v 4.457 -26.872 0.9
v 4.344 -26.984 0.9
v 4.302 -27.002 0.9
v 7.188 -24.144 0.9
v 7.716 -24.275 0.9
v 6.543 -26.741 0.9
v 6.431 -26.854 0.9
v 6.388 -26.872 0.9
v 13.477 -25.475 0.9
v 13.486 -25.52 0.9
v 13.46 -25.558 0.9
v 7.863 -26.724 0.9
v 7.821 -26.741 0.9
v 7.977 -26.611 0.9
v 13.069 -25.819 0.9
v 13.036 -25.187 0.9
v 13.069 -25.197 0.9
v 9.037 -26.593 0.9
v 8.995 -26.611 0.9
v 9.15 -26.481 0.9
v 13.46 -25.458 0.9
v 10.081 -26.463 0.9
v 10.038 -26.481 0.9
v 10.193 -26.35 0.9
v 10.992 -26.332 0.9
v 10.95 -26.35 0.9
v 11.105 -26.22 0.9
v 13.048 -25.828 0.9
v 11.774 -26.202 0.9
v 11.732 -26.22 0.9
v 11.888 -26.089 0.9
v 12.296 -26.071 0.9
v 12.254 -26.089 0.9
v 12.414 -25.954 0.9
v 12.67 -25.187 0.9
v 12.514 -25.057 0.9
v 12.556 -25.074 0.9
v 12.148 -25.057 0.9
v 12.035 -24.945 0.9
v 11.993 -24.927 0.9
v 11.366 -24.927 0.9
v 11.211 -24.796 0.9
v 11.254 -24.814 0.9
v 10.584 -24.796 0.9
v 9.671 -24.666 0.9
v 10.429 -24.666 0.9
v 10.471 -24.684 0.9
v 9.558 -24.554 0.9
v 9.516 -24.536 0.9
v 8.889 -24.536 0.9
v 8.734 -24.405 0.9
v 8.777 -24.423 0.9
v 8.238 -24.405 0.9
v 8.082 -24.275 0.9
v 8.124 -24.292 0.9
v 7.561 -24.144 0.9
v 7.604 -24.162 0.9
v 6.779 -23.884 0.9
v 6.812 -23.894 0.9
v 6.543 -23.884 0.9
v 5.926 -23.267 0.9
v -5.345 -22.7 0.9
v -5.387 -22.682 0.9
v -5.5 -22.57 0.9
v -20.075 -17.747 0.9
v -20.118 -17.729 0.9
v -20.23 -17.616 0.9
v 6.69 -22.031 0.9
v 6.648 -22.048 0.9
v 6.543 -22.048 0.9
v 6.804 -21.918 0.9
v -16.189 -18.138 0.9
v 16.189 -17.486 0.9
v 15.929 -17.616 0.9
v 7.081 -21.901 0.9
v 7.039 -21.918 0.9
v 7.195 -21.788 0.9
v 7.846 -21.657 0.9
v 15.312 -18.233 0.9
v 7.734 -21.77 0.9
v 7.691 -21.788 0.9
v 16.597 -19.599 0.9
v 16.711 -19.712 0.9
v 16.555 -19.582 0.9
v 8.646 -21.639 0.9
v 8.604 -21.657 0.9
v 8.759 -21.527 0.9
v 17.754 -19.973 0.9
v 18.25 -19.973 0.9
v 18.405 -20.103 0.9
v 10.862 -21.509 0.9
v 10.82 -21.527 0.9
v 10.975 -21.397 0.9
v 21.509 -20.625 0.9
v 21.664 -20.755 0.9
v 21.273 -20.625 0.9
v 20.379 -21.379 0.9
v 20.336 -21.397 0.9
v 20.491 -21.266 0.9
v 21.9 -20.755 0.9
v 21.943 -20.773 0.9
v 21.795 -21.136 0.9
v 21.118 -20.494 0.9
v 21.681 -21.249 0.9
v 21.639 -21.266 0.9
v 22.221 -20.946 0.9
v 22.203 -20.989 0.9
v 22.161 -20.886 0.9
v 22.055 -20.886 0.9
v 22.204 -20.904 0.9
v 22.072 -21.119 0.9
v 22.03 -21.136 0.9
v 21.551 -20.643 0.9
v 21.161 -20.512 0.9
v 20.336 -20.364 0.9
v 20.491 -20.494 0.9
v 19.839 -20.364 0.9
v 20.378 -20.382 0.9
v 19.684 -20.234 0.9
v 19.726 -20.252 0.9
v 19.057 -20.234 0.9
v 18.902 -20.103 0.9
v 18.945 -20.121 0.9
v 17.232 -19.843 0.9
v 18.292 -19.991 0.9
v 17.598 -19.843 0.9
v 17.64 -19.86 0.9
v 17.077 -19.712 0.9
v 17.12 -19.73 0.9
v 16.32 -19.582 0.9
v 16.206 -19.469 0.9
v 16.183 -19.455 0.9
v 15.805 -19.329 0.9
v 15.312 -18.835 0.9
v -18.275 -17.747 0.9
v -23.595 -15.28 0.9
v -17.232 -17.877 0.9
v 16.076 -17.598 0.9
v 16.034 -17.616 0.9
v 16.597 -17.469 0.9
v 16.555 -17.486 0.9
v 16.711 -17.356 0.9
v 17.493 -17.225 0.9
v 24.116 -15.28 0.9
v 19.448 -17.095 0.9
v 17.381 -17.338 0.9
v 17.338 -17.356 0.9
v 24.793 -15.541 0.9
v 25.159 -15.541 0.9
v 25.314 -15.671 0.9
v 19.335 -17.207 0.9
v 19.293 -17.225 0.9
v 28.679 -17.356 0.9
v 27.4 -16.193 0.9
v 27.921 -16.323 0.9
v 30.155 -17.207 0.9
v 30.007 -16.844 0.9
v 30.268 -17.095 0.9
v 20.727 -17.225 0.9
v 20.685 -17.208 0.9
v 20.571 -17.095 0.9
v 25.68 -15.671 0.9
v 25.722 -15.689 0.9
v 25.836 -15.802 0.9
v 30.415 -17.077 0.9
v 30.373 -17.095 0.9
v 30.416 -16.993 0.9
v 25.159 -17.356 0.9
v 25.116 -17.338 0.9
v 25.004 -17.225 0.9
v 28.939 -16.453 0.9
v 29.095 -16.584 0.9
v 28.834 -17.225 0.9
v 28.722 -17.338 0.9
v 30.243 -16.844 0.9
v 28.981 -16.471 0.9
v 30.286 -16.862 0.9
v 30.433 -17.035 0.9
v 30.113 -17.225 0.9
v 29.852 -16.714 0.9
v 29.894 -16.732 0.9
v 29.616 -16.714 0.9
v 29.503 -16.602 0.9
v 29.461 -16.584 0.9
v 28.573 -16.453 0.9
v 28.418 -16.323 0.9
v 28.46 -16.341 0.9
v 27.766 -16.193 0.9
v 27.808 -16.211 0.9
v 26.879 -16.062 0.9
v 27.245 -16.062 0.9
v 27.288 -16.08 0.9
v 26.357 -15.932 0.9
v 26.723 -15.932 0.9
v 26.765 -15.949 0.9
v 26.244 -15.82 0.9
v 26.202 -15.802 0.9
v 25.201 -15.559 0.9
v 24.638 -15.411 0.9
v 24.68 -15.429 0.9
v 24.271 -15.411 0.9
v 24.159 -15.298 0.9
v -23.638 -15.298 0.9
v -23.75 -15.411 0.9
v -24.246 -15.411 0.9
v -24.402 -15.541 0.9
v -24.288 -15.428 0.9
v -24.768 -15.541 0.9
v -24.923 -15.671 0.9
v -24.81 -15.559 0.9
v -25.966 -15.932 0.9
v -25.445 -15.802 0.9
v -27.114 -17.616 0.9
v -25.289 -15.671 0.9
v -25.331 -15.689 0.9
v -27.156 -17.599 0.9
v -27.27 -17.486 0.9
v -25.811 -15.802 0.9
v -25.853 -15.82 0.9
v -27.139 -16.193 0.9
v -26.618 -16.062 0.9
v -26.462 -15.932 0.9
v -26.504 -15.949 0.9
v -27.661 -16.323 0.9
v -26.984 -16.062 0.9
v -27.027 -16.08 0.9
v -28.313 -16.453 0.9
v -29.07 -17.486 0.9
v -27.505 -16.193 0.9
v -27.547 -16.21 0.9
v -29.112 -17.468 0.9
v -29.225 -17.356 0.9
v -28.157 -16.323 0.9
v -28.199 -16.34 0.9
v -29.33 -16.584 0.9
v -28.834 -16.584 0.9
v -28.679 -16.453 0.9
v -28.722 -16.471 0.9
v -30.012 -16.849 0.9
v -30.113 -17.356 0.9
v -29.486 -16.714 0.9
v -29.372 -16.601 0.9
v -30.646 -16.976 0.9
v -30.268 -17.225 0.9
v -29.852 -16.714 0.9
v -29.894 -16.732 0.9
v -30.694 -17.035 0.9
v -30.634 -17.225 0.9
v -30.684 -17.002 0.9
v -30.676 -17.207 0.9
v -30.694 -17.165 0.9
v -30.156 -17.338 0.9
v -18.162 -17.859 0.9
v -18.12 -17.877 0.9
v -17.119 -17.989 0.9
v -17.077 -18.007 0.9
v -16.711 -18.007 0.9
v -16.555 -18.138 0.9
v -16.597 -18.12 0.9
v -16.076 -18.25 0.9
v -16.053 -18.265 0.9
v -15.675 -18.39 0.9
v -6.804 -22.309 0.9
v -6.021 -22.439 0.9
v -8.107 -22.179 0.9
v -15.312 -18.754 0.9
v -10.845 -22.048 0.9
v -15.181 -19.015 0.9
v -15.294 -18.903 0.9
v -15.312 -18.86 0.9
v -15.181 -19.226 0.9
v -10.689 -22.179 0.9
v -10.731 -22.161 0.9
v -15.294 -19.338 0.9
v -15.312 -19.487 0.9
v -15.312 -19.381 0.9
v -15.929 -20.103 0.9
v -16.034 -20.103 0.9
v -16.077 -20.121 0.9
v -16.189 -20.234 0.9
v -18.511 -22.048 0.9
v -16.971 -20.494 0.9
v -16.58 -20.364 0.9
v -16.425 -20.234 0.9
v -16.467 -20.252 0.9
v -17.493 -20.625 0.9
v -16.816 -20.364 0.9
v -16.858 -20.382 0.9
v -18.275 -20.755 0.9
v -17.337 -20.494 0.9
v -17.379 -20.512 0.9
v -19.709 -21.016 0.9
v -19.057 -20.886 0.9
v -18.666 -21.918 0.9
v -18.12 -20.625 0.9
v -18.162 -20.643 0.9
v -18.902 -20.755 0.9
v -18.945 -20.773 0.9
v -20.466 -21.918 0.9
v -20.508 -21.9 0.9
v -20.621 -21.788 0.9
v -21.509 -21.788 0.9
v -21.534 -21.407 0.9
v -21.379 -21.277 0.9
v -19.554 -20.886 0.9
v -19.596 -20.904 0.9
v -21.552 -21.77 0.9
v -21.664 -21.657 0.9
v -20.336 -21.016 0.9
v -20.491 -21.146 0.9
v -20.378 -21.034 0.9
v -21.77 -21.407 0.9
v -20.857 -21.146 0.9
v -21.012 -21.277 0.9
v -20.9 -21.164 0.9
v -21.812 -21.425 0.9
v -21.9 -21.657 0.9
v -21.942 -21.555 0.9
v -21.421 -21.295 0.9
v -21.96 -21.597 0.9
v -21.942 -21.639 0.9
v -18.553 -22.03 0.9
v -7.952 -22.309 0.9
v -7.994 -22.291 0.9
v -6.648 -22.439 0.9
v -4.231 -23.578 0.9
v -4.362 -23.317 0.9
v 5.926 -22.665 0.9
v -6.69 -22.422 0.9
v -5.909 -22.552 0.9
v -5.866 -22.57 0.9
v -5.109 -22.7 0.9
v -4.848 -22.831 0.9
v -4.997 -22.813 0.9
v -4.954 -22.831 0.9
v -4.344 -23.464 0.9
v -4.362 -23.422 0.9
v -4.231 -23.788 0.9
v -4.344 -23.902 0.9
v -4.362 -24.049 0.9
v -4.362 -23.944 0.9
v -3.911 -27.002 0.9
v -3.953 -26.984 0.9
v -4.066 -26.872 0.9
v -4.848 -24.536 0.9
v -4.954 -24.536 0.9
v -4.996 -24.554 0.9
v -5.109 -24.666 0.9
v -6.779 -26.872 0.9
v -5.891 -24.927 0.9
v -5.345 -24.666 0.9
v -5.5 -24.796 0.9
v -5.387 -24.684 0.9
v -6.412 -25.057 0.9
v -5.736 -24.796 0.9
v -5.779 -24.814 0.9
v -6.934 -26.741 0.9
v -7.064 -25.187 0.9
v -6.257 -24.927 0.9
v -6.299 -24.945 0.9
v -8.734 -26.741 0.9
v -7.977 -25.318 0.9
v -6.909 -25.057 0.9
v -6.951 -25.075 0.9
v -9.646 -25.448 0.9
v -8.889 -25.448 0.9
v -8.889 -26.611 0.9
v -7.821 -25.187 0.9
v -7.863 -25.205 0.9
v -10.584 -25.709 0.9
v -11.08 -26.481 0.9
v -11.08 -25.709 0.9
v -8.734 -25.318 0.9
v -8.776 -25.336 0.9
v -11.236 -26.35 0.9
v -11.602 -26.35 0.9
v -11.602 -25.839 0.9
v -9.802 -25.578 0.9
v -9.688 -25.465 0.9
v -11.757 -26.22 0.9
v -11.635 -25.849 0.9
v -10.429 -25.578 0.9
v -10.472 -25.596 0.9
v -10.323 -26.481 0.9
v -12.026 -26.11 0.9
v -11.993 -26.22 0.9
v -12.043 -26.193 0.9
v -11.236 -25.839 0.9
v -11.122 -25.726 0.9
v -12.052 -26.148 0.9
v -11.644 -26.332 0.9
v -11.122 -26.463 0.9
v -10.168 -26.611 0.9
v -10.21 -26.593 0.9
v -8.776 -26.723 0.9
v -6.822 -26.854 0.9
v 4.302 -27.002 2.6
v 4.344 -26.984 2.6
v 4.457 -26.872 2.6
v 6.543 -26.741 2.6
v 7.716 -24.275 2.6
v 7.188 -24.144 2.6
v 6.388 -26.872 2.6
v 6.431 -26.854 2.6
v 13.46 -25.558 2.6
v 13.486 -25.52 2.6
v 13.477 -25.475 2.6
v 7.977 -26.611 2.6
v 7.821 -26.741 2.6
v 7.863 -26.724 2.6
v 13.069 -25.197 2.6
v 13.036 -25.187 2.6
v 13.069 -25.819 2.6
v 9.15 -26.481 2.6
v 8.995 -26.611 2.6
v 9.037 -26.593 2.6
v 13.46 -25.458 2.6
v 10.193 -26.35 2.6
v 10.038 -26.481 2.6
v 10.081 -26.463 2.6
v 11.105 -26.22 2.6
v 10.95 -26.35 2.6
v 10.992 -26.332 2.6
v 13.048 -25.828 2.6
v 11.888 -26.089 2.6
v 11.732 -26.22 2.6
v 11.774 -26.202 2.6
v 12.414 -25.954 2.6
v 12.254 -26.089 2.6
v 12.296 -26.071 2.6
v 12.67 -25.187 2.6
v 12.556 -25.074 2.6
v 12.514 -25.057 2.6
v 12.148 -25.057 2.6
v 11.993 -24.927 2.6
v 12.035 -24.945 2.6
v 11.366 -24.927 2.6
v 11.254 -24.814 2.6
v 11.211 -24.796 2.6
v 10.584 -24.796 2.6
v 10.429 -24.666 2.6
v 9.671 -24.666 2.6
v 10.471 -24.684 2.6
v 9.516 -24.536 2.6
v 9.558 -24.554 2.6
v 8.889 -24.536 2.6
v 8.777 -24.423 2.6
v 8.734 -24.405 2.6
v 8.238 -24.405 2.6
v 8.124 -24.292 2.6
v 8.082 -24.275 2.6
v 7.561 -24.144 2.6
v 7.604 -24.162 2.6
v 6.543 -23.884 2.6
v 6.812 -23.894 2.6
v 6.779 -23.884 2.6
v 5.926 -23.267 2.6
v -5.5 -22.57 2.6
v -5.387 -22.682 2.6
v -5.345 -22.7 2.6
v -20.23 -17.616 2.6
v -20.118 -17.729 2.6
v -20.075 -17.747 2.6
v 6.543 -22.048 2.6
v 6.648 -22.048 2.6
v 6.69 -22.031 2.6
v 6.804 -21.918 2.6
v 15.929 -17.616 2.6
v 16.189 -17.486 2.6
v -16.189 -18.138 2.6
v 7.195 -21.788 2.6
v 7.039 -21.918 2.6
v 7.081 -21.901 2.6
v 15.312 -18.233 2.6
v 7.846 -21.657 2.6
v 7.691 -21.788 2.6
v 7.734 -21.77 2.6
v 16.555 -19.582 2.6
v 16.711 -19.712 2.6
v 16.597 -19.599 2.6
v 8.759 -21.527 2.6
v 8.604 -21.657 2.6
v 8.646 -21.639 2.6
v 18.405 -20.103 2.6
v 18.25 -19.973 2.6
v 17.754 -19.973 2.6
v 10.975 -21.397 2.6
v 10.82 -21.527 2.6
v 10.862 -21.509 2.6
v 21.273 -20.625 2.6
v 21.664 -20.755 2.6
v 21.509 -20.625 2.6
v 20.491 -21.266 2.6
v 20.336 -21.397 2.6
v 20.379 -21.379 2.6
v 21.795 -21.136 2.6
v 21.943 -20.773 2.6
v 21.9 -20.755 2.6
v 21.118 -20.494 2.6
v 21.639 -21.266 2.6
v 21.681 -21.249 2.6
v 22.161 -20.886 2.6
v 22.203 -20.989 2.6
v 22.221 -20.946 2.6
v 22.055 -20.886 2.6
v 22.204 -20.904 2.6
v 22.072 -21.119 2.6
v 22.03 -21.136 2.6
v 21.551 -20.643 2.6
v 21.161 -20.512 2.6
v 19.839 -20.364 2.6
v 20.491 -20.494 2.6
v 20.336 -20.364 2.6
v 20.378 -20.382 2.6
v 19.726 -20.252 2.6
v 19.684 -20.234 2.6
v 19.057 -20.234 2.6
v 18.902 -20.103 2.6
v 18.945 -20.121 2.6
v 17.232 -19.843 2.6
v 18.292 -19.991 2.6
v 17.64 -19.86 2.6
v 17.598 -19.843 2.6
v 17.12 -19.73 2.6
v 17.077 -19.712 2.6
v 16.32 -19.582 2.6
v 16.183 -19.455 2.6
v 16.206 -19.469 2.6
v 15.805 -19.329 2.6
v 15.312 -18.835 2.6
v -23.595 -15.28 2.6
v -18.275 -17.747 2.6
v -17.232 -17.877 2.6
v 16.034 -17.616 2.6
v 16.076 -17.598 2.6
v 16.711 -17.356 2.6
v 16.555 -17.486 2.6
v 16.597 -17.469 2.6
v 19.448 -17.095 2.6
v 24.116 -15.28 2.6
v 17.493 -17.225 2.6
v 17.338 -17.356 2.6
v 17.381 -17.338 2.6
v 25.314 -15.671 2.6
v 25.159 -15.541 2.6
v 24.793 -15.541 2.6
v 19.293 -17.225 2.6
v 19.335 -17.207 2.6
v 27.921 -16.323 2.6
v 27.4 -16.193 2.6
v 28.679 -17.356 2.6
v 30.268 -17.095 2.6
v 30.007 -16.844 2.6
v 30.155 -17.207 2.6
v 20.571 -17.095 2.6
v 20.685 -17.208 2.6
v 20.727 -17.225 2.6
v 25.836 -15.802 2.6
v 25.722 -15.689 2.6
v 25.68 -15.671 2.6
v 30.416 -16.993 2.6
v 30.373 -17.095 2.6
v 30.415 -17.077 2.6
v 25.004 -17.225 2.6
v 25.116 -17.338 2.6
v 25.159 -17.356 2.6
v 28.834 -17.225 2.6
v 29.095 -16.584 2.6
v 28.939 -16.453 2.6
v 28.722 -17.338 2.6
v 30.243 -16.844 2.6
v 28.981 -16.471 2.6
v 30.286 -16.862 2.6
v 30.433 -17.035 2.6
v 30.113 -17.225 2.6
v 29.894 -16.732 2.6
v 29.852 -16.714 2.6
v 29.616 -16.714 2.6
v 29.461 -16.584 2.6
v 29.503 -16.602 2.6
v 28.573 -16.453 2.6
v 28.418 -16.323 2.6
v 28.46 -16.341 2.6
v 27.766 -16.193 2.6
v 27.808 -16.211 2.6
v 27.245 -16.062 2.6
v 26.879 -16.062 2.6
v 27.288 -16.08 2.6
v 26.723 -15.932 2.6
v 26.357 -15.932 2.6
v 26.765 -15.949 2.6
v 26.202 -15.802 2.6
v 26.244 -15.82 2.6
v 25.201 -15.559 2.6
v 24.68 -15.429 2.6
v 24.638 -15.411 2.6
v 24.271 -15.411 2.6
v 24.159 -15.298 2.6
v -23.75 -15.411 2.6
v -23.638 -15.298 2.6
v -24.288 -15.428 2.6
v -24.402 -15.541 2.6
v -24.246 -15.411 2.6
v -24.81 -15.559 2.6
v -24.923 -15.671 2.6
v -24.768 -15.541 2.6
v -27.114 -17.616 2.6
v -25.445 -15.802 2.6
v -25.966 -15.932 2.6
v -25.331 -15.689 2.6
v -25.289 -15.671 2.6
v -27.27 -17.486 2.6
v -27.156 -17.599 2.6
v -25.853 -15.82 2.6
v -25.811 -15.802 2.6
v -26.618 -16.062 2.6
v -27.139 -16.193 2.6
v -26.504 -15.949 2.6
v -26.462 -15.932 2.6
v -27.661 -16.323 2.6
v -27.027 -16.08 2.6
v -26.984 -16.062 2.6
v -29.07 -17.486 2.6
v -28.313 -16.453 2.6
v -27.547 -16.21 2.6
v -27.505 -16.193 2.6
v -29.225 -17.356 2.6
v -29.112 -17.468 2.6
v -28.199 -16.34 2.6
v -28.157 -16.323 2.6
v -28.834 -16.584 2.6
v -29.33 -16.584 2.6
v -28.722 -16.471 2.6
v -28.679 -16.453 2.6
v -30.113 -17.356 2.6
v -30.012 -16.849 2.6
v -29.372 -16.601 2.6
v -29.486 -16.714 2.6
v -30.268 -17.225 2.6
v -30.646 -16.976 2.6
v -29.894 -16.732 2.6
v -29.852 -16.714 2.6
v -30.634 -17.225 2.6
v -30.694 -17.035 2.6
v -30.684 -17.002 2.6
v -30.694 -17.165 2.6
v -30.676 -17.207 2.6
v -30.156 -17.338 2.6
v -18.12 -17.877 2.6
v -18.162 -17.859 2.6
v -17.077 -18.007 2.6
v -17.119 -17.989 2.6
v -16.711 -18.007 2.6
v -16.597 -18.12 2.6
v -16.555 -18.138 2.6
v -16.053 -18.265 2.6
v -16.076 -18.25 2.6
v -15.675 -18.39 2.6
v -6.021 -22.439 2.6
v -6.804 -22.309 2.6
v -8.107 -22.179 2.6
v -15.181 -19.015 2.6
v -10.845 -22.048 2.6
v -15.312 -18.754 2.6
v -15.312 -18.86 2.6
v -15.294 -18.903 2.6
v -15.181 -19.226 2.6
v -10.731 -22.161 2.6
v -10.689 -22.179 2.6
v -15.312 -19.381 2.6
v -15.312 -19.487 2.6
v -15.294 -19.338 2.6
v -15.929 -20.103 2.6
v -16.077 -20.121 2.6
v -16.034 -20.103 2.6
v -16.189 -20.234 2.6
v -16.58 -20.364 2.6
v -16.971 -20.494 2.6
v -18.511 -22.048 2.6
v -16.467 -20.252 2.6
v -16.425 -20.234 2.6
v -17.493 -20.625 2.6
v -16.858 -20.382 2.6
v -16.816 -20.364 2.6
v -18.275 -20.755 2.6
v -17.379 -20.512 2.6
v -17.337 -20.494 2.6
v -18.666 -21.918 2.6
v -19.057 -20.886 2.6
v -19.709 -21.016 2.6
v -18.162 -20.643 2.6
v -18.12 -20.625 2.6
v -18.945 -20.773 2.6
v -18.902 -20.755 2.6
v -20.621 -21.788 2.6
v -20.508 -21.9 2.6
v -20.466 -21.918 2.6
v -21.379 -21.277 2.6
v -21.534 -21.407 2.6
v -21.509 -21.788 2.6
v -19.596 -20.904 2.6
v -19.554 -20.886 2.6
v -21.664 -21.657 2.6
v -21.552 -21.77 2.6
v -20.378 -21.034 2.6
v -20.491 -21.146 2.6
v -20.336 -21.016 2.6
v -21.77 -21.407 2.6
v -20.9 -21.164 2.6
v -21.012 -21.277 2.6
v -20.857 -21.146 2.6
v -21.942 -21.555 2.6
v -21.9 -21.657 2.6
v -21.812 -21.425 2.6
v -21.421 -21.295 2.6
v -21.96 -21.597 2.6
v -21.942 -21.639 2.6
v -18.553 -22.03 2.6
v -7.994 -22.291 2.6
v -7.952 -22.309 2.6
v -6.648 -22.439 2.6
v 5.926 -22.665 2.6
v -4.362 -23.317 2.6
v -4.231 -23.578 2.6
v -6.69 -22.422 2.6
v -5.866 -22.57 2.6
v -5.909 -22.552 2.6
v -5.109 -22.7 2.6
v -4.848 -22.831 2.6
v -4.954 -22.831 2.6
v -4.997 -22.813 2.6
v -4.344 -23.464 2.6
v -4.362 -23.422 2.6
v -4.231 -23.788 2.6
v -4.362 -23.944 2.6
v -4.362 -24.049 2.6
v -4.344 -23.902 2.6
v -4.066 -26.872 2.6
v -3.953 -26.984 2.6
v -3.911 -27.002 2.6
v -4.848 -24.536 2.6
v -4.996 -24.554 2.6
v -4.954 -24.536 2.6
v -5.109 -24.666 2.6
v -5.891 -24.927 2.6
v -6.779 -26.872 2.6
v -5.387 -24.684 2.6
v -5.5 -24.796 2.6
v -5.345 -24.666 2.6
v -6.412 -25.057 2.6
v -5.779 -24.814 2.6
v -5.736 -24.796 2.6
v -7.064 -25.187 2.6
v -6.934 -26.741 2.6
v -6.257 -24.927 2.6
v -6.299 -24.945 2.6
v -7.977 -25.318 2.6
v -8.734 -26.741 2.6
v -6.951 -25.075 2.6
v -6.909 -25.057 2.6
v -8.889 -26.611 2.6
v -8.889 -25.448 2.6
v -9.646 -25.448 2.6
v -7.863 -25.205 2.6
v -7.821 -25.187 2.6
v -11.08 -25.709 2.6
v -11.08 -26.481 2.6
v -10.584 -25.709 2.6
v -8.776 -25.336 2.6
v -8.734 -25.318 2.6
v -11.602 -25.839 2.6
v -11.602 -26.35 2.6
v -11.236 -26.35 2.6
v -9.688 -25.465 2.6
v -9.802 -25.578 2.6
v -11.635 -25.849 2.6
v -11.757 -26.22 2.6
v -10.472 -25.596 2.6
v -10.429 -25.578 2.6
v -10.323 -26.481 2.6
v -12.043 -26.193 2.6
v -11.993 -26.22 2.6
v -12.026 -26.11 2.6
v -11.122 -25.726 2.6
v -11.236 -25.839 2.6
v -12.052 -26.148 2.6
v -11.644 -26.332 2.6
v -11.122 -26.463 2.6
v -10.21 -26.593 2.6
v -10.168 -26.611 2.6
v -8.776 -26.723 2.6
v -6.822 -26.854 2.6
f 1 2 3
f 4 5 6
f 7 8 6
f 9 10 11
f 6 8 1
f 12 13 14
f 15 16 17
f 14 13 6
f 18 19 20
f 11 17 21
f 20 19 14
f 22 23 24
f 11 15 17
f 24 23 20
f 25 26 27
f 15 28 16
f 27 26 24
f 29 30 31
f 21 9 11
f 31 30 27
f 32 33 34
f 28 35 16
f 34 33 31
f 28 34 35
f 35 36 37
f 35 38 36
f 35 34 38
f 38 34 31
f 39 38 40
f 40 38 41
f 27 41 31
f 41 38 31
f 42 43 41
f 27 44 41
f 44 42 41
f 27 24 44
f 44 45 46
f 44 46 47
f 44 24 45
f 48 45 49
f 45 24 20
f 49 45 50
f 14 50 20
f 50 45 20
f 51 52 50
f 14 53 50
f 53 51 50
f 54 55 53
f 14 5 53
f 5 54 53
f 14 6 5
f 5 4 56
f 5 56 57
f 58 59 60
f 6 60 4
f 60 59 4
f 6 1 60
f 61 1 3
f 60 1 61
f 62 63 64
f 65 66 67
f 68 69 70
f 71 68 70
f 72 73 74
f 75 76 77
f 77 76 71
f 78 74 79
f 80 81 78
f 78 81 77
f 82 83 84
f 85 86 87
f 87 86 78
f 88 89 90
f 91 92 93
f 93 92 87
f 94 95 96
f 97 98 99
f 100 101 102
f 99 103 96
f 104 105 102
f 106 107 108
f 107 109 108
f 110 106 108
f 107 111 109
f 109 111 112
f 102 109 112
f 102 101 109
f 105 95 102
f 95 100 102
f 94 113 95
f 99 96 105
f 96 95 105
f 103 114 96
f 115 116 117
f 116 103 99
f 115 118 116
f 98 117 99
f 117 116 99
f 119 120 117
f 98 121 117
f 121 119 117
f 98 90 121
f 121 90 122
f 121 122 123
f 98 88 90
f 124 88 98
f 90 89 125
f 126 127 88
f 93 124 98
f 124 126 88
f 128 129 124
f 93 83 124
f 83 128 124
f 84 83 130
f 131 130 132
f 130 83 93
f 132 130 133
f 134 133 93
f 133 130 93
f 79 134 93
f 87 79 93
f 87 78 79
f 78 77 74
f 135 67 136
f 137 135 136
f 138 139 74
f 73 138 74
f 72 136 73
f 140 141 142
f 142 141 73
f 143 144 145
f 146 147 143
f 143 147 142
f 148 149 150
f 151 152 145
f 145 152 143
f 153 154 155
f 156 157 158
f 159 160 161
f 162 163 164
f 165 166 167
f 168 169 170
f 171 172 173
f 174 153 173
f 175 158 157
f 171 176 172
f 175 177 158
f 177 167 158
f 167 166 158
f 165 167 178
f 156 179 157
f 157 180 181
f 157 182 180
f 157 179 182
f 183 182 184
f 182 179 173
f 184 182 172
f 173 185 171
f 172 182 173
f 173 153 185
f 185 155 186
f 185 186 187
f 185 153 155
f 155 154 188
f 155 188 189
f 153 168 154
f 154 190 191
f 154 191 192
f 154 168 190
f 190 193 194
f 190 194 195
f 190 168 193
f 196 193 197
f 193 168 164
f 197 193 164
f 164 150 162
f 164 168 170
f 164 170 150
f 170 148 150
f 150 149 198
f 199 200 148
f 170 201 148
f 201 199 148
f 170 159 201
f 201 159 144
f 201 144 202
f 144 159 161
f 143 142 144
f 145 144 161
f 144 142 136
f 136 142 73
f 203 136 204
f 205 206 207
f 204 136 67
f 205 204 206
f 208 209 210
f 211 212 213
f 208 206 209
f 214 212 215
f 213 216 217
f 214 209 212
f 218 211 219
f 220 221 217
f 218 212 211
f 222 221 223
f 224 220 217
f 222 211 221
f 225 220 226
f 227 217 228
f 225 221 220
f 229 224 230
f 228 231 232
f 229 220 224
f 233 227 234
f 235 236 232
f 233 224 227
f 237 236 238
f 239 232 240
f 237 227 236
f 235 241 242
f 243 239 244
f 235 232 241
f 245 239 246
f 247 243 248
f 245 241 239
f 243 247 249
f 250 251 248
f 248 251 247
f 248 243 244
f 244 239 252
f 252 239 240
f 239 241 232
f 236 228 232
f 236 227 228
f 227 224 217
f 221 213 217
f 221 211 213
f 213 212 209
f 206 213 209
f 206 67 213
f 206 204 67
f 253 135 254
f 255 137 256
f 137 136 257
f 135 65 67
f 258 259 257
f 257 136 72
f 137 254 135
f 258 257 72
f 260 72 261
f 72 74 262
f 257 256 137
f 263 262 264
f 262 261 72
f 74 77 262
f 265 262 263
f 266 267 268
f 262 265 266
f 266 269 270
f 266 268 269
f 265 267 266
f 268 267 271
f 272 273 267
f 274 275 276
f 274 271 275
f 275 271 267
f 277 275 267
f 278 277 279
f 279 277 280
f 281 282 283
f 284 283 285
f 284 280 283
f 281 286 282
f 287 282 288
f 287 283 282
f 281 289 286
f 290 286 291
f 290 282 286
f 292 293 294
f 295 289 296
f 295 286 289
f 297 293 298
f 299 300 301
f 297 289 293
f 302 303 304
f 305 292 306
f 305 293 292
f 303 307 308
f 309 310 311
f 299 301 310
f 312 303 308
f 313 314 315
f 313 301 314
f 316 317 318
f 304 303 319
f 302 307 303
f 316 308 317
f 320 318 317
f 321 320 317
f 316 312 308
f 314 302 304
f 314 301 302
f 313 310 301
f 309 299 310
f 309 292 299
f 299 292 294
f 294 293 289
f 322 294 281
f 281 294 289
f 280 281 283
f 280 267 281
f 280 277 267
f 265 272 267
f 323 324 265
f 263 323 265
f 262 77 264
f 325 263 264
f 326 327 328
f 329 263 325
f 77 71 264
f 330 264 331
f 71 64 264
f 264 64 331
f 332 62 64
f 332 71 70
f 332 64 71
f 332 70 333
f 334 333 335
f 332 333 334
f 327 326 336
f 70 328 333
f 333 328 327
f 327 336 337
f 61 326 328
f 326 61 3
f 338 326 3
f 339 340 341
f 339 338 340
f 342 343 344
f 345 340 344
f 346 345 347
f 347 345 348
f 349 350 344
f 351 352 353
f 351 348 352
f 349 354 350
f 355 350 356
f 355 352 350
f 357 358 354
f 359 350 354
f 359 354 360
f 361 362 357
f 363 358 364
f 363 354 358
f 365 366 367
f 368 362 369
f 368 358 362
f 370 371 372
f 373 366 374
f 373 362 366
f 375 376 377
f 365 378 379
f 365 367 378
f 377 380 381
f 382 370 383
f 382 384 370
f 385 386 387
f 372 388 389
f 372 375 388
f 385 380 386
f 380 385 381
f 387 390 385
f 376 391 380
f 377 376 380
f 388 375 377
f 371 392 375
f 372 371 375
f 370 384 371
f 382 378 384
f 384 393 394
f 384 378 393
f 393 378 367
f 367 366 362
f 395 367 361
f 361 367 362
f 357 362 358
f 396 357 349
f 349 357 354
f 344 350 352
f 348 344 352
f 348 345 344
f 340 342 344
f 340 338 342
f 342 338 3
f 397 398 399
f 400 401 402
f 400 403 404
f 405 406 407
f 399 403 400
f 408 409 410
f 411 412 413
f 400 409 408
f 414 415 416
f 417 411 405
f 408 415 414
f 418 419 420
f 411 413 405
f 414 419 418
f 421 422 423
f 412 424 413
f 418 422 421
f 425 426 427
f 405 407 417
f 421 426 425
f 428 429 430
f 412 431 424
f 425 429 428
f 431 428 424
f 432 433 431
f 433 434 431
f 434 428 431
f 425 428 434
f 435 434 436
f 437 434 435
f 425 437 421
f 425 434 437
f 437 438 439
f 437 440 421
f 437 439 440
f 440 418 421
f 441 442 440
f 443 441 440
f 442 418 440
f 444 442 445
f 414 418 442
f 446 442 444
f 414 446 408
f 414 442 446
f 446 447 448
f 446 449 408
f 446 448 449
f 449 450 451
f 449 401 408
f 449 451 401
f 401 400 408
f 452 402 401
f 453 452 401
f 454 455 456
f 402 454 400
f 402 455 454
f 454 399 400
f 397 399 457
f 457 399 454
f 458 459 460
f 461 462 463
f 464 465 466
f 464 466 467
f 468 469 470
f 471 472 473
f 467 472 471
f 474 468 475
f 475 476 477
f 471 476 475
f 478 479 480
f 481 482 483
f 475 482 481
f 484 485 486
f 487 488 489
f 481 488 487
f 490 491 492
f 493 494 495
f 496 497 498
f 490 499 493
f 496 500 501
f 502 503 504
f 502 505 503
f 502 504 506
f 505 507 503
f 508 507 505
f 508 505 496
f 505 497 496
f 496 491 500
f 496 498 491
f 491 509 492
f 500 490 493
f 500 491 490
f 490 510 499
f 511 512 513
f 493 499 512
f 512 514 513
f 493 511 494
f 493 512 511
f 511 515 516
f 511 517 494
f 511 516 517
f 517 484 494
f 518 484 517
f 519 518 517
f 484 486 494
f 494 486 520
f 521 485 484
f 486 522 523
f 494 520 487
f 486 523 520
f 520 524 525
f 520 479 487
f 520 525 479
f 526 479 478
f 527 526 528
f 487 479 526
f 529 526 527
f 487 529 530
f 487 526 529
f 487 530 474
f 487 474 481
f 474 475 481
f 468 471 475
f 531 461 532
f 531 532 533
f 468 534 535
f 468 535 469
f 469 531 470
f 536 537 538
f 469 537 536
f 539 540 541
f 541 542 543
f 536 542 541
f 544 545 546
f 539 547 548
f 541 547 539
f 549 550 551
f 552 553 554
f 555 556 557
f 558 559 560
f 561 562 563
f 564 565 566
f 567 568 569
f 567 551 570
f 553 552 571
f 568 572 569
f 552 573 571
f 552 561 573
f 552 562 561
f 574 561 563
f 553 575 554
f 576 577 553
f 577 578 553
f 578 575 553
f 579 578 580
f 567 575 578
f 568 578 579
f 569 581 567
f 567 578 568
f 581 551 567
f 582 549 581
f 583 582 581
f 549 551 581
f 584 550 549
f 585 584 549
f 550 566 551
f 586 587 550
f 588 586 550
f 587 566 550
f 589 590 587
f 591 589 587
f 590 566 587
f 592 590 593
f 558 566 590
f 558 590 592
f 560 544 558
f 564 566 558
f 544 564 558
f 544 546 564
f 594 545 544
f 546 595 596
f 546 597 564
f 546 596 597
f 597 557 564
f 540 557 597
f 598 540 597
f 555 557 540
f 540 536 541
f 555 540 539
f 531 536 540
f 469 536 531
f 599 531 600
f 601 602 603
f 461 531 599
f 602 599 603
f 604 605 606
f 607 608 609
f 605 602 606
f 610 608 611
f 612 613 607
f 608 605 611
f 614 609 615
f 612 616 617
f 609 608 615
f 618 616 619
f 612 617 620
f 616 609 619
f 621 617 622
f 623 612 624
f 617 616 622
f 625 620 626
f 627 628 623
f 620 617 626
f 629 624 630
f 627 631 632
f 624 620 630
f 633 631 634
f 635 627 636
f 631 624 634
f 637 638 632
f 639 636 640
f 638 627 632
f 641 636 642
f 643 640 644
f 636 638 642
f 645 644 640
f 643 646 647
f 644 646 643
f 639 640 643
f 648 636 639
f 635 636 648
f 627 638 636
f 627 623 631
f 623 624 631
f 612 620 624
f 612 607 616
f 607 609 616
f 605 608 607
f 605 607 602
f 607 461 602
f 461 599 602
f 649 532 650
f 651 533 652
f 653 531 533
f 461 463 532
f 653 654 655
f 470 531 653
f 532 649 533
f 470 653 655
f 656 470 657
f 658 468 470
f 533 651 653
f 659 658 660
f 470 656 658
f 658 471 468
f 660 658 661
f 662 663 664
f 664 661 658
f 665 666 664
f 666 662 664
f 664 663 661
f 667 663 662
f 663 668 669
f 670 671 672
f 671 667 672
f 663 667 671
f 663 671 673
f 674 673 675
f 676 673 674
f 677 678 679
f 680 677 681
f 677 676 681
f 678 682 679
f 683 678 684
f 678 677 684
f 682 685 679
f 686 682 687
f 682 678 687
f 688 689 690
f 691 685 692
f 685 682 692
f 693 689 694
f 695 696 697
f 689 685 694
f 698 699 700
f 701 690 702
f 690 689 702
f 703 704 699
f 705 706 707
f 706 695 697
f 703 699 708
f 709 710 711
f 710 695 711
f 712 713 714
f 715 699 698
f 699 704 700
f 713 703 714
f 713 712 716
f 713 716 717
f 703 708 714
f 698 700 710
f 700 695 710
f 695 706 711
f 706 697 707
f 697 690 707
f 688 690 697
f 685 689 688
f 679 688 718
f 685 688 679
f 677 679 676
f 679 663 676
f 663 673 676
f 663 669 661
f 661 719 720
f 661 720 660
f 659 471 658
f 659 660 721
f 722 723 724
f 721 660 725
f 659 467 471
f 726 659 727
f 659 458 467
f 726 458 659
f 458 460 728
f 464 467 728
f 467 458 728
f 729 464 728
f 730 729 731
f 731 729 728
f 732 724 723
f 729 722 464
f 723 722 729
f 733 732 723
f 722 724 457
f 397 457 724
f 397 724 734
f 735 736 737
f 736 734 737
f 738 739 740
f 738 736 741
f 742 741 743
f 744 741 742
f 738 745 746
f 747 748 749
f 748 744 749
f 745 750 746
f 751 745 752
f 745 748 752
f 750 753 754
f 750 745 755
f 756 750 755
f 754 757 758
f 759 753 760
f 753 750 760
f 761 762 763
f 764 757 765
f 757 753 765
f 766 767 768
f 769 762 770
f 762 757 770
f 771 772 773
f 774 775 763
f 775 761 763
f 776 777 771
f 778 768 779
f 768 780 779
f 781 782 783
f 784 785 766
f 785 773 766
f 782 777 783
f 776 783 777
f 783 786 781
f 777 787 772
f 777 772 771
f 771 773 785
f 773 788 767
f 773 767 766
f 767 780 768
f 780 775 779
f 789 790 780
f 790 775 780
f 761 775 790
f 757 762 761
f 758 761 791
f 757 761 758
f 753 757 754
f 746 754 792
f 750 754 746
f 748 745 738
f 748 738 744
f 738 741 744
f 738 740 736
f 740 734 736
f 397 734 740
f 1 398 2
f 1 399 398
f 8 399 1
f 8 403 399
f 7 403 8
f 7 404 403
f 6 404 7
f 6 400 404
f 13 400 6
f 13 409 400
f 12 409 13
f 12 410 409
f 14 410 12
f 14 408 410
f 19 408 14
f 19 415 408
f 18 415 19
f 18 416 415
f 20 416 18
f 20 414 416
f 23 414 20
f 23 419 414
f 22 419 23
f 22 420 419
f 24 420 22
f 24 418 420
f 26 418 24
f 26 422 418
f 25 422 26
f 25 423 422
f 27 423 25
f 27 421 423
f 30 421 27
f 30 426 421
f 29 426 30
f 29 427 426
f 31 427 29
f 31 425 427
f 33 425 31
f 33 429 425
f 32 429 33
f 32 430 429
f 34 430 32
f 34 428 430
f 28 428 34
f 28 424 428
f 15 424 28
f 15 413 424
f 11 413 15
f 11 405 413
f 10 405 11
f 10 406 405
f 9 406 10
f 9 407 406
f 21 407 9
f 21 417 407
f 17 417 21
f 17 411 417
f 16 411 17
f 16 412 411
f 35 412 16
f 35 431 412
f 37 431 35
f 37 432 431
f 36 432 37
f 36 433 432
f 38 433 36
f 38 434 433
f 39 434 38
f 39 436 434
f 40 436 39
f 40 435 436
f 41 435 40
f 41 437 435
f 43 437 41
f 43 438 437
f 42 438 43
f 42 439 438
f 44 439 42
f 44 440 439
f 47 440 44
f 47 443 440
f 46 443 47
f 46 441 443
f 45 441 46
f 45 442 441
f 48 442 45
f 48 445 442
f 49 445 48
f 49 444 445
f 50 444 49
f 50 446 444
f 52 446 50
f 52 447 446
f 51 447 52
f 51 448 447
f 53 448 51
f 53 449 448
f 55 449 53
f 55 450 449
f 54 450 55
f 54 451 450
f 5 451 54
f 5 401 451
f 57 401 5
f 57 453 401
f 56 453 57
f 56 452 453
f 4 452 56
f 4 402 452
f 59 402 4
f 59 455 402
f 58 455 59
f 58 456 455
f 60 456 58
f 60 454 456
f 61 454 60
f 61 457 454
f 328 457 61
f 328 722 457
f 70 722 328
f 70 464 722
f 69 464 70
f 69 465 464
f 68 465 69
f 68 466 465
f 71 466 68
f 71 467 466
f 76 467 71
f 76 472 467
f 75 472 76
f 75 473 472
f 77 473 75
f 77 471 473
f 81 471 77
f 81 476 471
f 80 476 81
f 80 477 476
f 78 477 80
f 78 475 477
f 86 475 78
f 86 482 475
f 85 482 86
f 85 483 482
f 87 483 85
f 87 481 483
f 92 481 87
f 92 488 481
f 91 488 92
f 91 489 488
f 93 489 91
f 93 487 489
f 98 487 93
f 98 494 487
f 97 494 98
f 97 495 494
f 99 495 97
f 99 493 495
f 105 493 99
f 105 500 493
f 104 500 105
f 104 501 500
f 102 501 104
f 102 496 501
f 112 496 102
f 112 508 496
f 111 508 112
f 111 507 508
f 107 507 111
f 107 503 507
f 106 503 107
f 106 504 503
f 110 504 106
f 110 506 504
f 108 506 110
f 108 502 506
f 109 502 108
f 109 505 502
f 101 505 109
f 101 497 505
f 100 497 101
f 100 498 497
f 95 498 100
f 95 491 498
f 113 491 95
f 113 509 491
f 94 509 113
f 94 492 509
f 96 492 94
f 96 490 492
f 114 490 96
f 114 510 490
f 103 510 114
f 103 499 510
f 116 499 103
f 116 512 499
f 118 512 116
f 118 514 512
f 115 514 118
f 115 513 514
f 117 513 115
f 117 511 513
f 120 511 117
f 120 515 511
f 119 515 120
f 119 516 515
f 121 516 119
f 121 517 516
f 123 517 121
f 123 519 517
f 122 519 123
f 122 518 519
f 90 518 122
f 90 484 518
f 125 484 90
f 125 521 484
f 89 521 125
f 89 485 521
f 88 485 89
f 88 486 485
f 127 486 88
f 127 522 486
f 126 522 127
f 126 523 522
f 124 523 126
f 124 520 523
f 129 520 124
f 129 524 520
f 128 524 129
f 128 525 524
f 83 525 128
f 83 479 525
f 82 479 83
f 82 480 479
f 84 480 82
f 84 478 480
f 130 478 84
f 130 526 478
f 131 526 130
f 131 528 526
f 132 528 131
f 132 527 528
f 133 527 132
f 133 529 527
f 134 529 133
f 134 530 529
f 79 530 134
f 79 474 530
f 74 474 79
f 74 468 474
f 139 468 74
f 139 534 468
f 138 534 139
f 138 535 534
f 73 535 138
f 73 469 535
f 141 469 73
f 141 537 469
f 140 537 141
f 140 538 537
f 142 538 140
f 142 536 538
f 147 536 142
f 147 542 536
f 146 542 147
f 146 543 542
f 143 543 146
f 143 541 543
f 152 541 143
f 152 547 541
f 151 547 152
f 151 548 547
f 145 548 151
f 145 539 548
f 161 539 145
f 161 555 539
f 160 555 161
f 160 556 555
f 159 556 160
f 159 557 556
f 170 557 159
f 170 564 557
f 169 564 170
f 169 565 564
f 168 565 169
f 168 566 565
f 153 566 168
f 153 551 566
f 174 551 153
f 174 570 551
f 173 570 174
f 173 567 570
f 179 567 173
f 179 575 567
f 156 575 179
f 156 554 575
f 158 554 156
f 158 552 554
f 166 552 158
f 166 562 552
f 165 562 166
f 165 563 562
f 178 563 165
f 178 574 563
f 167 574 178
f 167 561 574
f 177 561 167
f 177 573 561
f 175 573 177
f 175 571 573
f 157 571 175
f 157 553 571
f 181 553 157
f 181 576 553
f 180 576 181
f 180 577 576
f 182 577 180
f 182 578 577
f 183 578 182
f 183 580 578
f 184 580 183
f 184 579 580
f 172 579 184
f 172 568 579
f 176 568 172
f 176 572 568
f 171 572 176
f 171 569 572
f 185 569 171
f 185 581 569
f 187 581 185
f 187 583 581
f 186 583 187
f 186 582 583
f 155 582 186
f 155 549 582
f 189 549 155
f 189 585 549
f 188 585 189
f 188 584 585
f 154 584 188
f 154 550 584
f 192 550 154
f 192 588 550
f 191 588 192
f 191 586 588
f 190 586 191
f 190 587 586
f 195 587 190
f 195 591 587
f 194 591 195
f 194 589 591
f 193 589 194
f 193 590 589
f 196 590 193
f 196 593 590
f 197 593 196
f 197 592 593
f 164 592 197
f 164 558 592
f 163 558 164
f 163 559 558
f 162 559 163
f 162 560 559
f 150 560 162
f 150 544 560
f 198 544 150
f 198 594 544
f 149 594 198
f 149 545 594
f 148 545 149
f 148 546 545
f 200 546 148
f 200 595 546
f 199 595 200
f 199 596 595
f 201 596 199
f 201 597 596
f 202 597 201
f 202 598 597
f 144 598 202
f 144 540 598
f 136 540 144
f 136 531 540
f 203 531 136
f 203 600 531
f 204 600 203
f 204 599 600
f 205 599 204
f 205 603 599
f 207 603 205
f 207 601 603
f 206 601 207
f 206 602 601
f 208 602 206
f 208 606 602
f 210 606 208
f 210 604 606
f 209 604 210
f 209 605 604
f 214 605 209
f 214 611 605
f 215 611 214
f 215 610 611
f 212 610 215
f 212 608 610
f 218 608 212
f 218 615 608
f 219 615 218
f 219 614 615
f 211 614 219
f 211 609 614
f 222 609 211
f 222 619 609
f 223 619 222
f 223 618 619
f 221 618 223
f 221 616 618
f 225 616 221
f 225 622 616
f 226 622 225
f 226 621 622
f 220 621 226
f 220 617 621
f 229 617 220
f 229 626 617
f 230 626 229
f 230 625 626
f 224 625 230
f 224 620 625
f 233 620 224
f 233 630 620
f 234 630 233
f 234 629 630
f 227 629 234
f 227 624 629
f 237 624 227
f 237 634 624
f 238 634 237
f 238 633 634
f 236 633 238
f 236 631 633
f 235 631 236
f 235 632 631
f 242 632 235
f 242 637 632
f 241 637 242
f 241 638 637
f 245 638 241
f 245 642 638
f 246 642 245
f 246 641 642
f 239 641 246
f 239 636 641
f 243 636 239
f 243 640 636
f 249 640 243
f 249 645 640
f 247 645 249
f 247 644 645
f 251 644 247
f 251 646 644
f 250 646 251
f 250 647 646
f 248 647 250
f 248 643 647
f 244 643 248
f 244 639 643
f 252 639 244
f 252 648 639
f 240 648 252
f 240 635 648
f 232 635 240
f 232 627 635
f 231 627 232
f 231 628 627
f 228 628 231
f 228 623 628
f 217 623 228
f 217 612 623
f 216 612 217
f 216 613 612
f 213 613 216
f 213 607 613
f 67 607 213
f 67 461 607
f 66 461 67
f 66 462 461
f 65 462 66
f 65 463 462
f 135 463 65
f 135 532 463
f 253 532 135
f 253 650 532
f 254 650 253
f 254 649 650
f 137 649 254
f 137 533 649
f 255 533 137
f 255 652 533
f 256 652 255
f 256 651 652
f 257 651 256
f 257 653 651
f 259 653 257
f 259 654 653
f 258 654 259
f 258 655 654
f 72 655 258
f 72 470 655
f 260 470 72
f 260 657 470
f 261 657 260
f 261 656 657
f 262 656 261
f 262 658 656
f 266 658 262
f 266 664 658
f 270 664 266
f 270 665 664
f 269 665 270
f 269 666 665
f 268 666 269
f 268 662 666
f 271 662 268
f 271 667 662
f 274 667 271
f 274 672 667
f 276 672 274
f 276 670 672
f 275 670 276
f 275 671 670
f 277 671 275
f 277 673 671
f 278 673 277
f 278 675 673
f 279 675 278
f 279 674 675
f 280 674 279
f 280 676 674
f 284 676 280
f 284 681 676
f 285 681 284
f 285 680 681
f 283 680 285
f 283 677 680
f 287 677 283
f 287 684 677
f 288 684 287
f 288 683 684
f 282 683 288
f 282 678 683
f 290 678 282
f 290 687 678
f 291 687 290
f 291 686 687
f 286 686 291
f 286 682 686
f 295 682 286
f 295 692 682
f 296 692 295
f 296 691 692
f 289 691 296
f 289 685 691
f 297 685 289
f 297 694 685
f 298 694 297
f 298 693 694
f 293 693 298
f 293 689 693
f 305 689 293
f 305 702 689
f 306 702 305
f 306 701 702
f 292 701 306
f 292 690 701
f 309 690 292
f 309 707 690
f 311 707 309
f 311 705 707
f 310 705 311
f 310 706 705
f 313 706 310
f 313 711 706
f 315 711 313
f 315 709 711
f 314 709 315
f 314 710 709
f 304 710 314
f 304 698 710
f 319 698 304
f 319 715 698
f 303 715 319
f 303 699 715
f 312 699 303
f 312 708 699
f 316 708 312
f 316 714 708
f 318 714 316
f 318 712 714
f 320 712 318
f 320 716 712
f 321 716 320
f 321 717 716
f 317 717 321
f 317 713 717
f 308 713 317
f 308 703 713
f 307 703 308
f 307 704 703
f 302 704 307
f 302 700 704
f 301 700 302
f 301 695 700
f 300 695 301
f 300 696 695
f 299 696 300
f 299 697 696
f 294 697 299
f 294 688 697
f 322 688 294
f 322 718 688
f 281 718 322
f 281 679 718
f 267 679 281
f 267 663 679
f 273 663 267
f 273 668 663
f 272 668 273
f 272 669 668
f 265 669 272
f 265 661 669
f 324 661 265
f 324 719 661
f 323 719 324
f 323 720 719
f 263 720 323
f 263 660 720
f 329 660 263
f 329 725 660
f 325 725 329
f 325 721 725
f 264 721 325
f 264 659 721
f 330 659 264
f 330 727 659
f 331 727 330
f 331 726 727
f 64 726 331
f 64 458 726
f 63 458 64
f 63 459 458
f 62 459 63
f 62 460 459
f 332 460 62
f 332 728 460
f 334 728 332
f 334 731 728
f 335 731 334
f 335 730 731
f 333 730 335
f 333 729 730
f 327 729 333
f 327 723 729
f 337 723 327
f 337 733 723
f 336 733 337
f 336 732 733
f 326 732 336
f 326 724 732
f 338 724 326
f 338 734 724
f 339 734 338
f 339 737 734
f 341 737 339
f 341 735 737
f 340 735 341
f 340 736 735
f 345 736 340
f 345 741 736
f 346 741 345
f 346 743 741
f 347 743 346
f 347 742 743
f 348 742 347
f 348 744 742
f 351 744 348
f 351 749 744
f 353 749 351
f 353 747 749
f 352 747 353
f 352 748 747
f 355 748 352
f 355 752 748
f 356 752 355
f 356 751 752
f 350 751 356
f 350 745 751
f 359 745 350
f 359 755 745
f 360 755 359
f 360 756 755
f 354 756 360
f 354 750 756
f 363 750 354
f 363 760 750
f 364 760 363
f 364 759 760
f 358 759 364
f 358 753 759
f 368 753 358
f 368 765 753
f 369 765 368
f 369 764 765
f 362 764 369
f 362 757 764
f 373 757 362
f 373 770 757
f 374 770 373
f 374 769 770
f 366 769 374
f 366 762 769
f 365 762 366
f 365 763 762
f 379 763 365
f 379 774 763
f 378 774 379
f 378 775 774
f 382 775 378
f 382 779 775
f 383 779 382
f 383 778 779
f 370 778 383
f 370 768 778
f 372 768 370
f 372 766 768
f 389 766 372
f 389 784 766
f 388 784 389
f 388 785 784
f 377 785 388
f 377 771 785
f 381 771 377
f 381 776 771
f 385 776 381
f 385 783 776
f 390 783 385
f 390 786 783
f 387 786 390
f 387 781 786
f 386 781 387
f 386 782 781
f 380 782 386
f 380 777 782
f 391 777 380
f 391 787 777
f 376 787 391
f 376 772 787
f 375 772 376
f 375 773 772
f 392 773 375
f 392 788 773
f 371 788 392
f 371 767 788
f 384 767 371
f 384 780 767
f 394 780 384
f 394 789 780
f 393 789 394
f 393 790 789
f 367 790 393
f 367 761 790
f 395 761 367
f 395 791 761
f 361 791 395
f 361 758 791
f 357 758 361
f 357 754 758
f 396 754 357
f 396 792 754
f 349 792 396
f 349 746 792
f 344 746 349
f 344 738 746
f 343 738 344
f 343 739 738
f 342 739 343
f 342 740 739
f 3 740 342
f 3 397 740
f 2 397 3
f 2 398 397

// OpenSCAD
$fn = 24;
translate([0, -2.500, 0.900])
  linear_extrude(height=1.700) {
offset(r=0.06, $fn=8) {
    polygon(points=[[-30.634,-14.665],[-30.243,-14.665],[-30.113,-14.796],[-29.200,-14.796],[-29.070,-14.926],[-27.245,-14.926],[-27.114,-15.056],[-20.205,-15.056],[-20.075,-15.187],[-18.250,-15.187],[-18.120,-15.317],[-17.207,-15.317],[-17.077,-15.447],[-16.686,-15.447],[-16.555,-15.578],[-16.164,-15.578],[-16.034,-15.708],[-15.643,-15.838],[-15.252,-16.229],[-15.252,-16.360],[-15.121,-16.490],[-15.121,-16.751],[-15.252,-16.881],[-15.252,-17.012],[-15.904,-17.663],[-16.034,-17.663],[-16.164,-17.794],[-16.425,-17.794],[-16.555,-17.924],[-16.816,-17.924],[-16.946,-18.054],[-17.337,-18.054],[-17.468,-18.185],[-18.120,-18.185],[-18.250,-18.315],[-18.902,-18.315],[-19.032,-18.446],[-19.554,-18.446],[-19.684,-18.576],[-20.336,-18.576],[-20.466,-18.706],[-20.857,-18.706],[-20.987,-18.837],[-21.379,-18.837],[-21.509,-18.967],[-21.770,-18.967],[-21.900,-19.097],[-21.639,-19.097],[-21.509,-19.228],[-20.596,-19.228],[-20.466,-19.358],[-18.641,-19.358],[-18.511,-19.488],[-10.820,-19.488],[-10.689,-19.619],[-8.082,-19.619],[-7.952,-19.749],[-6.779,-19.749],[-6.648,-19.879],[-5.996,-19.879],[-5.866,-20.010],[-5.475,-20.010],[-5.345,-20.140],[-5.084,-20.140],[-4.954,-20.271],[-4.823,-20.271],[-4.302,-20.792],[-4.302,-20.922],[-4.171,-21.053],[-4.171,-21.313],[-4.302,-21.444],[-4.302,-21.574],[-4.823,-22.096],[-4.954,-22.096],[-5.084,-22.226],[-5.345,-22.226],[-5.475,-22.356],[-5.736,-22.356],[-5.866,-22.487],[-6.257,-22.487],[-6.387,-22.617],[-6.909,-22.617],[-7.039,-22.747],[-7.821,-22.747],[-7.952,-22.878],[-8.734,-22.878],[-8.864,-23.008],[-9.646,-23.008],[-9.777,-23.138],[-10.429,-23.138],[-10.559,-23.269],[-11.080,-23.269],[-11.211,-23.399],[-11.602,-23.399],[-11.993,-23.660],[-11.732,-23.660],[-11.602,-23.790],[-11.211,-23.790],[-11.080,-23.921],[-10.298,-23.921],[-10.168,-24.051],[-8.864,-24.051],[-8.734,-24.181],[-6.909,-24.181],[-6.779,-24.312],[-4.041,-24.312],[-3.911,-24.442],[4.302,-24.442],[4.432,-24.312],[6.388,-24.312],[6.518,-24.181],[7.821,-24.181],[7.952,-24.051],[8.995,-24.051],[9.125,-23.921],[10.038,-23.921],[10.168,-23.790],[10.950,-23.790],[11.080,-23.660],[11.732,-23.660],[11.863,-23.529],[12.254,-23.529],[12.384,-23.399],[13.036,-23.269],[13.427,-23.008],[13.036,-22.747],[12.645,-22.747],[12.514,-22.617],[12.123,-22.617],[11.993,-22.487],[11.341,-22.487],[11.211,-22.356],[10.559,-22.356],[10.429,-22.226],[9.646,-22.226],[9.516,-22.096],[8.864,-22.096],[8.734,-21.965],[8.213,-21.965],[8.082,-21.835],[7.691,-21.835],[7.561,-21.704],[7.170,-21.704],[6.779,-21.444],[6.518,-21.444],[5.866,-20.792],[5.866,-20.140],[6.518,-19.488],[6.648,-19.488],[6.779,-19.358],[7.039,-19.358],[7.170,-19.228],[7.691,-19.228],[7.821,-19.097],[8.604,-19.097],[8.734,-18.967],[10.820,-18.967],[10.950,-18.837],[20.336,-18.837],[20.466,-18.706],[21.639,-18.706],[21.770,-18.576],[22.030,-18.576],[22.161,-18.446],[22.030,-18.446],[21.900,-18.315],[21.639,-18.315],[21.509,-18.185],[21.248,-18.185],[21.118,-18.054],[20.466,-18.054],[20.336,-17.924],[19.814,-17.924],[19.684,-17.794],[19.032,-17.794],[18.902,-17.663],[18.380,-17.663],[18.250,-17.533],[17.729,-17.533],[17.598,-17.403],[17.207,-17.403],[17.077,-17.272],[16.686,-17.272],[16.555,-17.142],[16.295,-17.142],[16.164,-17.012],[15.773,-16.881],[15.252,-16.360],[15.252,-15.708],[15.904,-15.056],[16.034,-15.056],[16.164,-14.926],[16.555,-14.926],[16.686,-14.796],[17.338,-14.796],[17.468,-14.665],[19.293,-14.665],[19.423,-14.535],[20.596,-14.535],[20.727,-14.665],[25.029,-14.665],[25.159,-14.796],[28.679,-14.796],[28.809,-14.665],[30.113,-14.665],[30.243,-14.535],[30.504,-14.535],[30.373,-14.535],[30.243,-14.404],[29.982,-14.404],[29.852,-14.274],[29.591,-14.274],[29.461,-14.144],[29.070,-14.144],[28.939,-14.013],[28.548,-14.013],[28.418,-13.883],[27.896,-13.883],[27.766,-13.753],[27.375,-13.753],[27.245,-13.622],[26.854,-13.622],[26.723,-13.492],[26.332,-13.492],[26.202,-13.362],[25.811,-13.362],[25.680,-13.231],[25.289,-13.231],[25.159,-13.101],[24.768,-13.101],[24.638,-12.971],[24.246,-12.971],[24.116,-12.840],[-23.595,-12.840],[-23.725,-12.971],[-24.246,-12.971],[-24.377,-13.101],[-24.768,-13.101],[-24.898,-13.231],[-25.289,-13.231],[-25.420,-13.362],[-25.811,-13.362],[-25.941,-13.492],[-26.462,-13.492],[-26.593,-13.622],[-26.984,-13.622],[-27.114,-13.753],[-27.505,-13.753],[-27.636,-13.883],[-28.157,-13.883],[-28.288,-14.013],[-28.679,-14.013],[-28.809,-14.144],[-29.330,-14.144],[-29.461,-14.274],[-29.852,-14.274],[-29.982,-14.404],[-30.634,-14.535]], paths=[[0,1,2,3,4,5,6,7,8,9,10,11,12,13,14,15,16,17,18,19,20,21,22,23,24,25,26,27,28,29,30,31,32,33,34,35,36,37,38,39,40,41,42,43,44,45,46,47,48,49,50,51,52,53,54,55,56,57,58,59,60,61,62,63,64,65,66,67,68,69,70,71,72,73,74,75,76,77,78,79,80,81,82,83,84,85,86,87,88,89,90,91,92,93,94,95,96,97,98,99,100,101,102,103,104,105,106,107,108,109,110,111,112,113,114,115,116,117,118,119,120,121,122,123,124,125,126,127,128,129,130,131,132,133,134,135,136,137,138,139,140,141,142,143,144,145,146,147,148,149,150,151,152,153,154,155,156,157,158,159,160,161,162,163,164,165,166,167,168,169,170,171,172,173,174,175,176,177,178,179,180,181,182,183,184,185,186,187,188,189,190,191,192,193,194,195,196,197,198,199,200,201,202,203,204,205,206,207,208,209,210,211,212,213,214,215,216,217,218,219,220,221,222,223,224,225,226,227,228,229,230,231,232,233,234,235,236,237,238,239,240,241,242,243,244,245,246,247,248,249,250,251,252,253,254,255,256,257]]);
}
}
